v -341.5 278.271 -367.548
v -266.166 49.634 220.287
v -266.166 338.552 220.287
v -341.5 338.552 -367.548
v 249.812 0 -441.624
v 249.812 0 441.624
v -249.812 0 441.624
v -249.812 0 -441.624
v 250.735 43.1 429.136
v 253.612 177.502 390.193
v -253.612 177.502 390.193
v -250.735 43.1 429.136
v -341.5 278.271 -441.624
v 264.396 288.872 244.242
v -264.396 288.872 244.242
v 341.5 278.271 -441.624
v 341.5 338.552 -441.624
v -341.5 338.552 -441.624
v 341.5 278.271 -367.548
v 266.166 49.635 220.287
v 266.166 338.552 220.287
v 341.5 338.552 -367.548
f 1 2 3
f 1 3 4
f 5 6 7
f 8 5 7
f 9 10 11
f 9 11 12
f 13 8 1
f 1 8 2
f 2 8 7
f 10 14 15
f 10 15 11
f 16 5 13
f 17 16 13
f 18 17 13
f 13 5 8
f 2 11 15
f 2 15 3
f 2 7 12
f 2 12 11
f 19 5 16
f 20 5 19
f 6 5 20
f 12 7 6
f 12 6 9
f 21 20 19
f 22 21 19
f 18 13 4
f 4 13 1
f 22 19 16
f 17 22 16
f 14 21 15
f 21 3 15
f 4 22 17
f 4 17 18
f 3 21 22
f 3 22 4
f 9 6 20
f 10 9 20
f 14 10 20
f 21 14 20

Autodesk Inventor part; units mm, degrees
ref_plane "YZ Plane" through (0, 0, 0) normal (1, 0, 0) x (0, 1, 0)
ref_plane "XZ Plane" through (0, 0, 0) normal (0, 1, 0) x (-1, 0, 0)
ref_plane "XY Plane" through (0, 0, 0) normal (0, 0, 1) x (1, 0, 0)
sketch "スケッチ1" plane through (0, 0, 0) normal (0, 1, 0) x (-1, 0, 0)
  line L0 (341.5, 441.624) -> (-341.5, 441.624)
  line L1 (-341.5, 441.624) -> (-341.5, -441.624)
  line L2 (-341.5, -441.624) -> (341.5, -441.624)
  line L3 (341.5, -441.624) -> (341.5, 441.624)
  line L4 (0, -618.2736) -> (0, 618.2736) projected
  line L5 (478.1, 0) -> (-478.1, 0) projected
  point P0 (0, 0)
  point P1 (0, 441.624)
  point P2 (341.5, 0)
  dimension "d0" = 883.248
  dimension "d1" = 683
extrude "押し出し1" add sketch "スケッチ1" along normal blind 338.552
sketch "スケッチ2" plane through (0, 0, 0) normal (0, -1, 0) x (1, 0, 0)
  line L0 (-341.5, 441.624) -> (341.5, 441.624) projected
  line L1 (249.8123, 441.624) -> (266.1663, 220.287)
  line L2 (266.1663, 220.287) -> (341.5, -367.5482)
  line L3 (341.5, 441.624) -> (341.5, -441.624) projected
  line L4 (249.8123, 441.624) -> (341.5, 441.624)
  line L5 (341.5, 441.624) -> (341.5, -367.5482)
  line L6 (0, -782.4861) -> (0, 1603.5489) projected
  line L7 (-249.8123, 441.624) -> (-266.1663, 220.287)
  line L8 (-266.1663, 220.287) -> (-341.5, -367.5482)
  line L9 (-249.8123, 441.624) -> (-341.5, 441.624)
  line L10 (-341.5, 441.624) -> (-341.5, -367.5482)
  point P0 (0, 0)
  point P1 (0, 1262.6867)
  point P2 (-341.5, 441.624)
extrude "押し出し2" cut sketch "スケッチ2" against normal through all
sketch "スケッチ3" plane through (-249.8123, 0, 441.624) normal (0, 0, 1) x (1, 0, 0)
  line L0 (0, 0) -> (499.6245, 0) projected
  line L1 (0, 0) -> (-91.6877, 278.2714)
  line L2 (-91.6877, 0) -> (-91.6877, 338.552) projected
  line L3 (-16.354, 0) -> (-91.6877, 0) projected
  line L4 (0, 0) -> (-91.6877, 0)
  line L5 (-91.6877, 0) -> (-91.6877, 278.2714)
  line L6 (249.8123, 0) -> (249.8123, -75.9213)
  line L7 (499.6245, 0) -> (0, 0)
  line L8 (499.6245, 0) -> (591.3123, 278.2714)
  line L9 (591.3123, 0) -> (591.3123, 338.552)
  line L10 (515.9785, 0) -> (591.3123, 0)
  line L11 (499.6245, 0) -> (591.3123, 0)
  line L12 (591.3123, 0) -> (591.3123, 278.2714)
extrude "押し出し3" cut sketch "スケッチ3" against normal through all
sketch "スケッチ4" plane through (0, 0, 0) normal (1, 0, 0) x (0, 1, 0)
  line L0 (0, 441.624) -> (338.552, 441.624) projected
  line L1 (0, 441.624) -> (43.0995, 429.1359)
  line L2 (43.0995, 429.1359) -> (216.735, -84.6593)
  line L3 (216.735, -84.6593) -> (12.1682, -441.624)
  line L4 (0, -441.624) -> (278.2714, -441.624) projected
  line L5 (12.1682, -441.624) -> (0, -441.624)
  line L6 (0, -441.624) -> (0, 441.624)
  line L7 (0, 441.624) -> (338.552, 441.624)
  line L8 (338.552, 220.287) -> (338.552, -367.5482) projected
  line L9 (338.552, 441.624) -> (338.552, 220.287)
  line L10 (338.552, 220.287) -> (288.8719, 244.2421)
  line L11 (288.8719, 244.2421) -> (177.502, 390.1926)
  line L12 (177.502, 390.1926) -> (43.0995, 429.1359)
  point P0 (0, 0)
extrude "押し出し5" cut sketch "スケッチ4" along normal through all both and the other way through all contours L0 L9 L10 L11 L12 L1
properties part number "add"
